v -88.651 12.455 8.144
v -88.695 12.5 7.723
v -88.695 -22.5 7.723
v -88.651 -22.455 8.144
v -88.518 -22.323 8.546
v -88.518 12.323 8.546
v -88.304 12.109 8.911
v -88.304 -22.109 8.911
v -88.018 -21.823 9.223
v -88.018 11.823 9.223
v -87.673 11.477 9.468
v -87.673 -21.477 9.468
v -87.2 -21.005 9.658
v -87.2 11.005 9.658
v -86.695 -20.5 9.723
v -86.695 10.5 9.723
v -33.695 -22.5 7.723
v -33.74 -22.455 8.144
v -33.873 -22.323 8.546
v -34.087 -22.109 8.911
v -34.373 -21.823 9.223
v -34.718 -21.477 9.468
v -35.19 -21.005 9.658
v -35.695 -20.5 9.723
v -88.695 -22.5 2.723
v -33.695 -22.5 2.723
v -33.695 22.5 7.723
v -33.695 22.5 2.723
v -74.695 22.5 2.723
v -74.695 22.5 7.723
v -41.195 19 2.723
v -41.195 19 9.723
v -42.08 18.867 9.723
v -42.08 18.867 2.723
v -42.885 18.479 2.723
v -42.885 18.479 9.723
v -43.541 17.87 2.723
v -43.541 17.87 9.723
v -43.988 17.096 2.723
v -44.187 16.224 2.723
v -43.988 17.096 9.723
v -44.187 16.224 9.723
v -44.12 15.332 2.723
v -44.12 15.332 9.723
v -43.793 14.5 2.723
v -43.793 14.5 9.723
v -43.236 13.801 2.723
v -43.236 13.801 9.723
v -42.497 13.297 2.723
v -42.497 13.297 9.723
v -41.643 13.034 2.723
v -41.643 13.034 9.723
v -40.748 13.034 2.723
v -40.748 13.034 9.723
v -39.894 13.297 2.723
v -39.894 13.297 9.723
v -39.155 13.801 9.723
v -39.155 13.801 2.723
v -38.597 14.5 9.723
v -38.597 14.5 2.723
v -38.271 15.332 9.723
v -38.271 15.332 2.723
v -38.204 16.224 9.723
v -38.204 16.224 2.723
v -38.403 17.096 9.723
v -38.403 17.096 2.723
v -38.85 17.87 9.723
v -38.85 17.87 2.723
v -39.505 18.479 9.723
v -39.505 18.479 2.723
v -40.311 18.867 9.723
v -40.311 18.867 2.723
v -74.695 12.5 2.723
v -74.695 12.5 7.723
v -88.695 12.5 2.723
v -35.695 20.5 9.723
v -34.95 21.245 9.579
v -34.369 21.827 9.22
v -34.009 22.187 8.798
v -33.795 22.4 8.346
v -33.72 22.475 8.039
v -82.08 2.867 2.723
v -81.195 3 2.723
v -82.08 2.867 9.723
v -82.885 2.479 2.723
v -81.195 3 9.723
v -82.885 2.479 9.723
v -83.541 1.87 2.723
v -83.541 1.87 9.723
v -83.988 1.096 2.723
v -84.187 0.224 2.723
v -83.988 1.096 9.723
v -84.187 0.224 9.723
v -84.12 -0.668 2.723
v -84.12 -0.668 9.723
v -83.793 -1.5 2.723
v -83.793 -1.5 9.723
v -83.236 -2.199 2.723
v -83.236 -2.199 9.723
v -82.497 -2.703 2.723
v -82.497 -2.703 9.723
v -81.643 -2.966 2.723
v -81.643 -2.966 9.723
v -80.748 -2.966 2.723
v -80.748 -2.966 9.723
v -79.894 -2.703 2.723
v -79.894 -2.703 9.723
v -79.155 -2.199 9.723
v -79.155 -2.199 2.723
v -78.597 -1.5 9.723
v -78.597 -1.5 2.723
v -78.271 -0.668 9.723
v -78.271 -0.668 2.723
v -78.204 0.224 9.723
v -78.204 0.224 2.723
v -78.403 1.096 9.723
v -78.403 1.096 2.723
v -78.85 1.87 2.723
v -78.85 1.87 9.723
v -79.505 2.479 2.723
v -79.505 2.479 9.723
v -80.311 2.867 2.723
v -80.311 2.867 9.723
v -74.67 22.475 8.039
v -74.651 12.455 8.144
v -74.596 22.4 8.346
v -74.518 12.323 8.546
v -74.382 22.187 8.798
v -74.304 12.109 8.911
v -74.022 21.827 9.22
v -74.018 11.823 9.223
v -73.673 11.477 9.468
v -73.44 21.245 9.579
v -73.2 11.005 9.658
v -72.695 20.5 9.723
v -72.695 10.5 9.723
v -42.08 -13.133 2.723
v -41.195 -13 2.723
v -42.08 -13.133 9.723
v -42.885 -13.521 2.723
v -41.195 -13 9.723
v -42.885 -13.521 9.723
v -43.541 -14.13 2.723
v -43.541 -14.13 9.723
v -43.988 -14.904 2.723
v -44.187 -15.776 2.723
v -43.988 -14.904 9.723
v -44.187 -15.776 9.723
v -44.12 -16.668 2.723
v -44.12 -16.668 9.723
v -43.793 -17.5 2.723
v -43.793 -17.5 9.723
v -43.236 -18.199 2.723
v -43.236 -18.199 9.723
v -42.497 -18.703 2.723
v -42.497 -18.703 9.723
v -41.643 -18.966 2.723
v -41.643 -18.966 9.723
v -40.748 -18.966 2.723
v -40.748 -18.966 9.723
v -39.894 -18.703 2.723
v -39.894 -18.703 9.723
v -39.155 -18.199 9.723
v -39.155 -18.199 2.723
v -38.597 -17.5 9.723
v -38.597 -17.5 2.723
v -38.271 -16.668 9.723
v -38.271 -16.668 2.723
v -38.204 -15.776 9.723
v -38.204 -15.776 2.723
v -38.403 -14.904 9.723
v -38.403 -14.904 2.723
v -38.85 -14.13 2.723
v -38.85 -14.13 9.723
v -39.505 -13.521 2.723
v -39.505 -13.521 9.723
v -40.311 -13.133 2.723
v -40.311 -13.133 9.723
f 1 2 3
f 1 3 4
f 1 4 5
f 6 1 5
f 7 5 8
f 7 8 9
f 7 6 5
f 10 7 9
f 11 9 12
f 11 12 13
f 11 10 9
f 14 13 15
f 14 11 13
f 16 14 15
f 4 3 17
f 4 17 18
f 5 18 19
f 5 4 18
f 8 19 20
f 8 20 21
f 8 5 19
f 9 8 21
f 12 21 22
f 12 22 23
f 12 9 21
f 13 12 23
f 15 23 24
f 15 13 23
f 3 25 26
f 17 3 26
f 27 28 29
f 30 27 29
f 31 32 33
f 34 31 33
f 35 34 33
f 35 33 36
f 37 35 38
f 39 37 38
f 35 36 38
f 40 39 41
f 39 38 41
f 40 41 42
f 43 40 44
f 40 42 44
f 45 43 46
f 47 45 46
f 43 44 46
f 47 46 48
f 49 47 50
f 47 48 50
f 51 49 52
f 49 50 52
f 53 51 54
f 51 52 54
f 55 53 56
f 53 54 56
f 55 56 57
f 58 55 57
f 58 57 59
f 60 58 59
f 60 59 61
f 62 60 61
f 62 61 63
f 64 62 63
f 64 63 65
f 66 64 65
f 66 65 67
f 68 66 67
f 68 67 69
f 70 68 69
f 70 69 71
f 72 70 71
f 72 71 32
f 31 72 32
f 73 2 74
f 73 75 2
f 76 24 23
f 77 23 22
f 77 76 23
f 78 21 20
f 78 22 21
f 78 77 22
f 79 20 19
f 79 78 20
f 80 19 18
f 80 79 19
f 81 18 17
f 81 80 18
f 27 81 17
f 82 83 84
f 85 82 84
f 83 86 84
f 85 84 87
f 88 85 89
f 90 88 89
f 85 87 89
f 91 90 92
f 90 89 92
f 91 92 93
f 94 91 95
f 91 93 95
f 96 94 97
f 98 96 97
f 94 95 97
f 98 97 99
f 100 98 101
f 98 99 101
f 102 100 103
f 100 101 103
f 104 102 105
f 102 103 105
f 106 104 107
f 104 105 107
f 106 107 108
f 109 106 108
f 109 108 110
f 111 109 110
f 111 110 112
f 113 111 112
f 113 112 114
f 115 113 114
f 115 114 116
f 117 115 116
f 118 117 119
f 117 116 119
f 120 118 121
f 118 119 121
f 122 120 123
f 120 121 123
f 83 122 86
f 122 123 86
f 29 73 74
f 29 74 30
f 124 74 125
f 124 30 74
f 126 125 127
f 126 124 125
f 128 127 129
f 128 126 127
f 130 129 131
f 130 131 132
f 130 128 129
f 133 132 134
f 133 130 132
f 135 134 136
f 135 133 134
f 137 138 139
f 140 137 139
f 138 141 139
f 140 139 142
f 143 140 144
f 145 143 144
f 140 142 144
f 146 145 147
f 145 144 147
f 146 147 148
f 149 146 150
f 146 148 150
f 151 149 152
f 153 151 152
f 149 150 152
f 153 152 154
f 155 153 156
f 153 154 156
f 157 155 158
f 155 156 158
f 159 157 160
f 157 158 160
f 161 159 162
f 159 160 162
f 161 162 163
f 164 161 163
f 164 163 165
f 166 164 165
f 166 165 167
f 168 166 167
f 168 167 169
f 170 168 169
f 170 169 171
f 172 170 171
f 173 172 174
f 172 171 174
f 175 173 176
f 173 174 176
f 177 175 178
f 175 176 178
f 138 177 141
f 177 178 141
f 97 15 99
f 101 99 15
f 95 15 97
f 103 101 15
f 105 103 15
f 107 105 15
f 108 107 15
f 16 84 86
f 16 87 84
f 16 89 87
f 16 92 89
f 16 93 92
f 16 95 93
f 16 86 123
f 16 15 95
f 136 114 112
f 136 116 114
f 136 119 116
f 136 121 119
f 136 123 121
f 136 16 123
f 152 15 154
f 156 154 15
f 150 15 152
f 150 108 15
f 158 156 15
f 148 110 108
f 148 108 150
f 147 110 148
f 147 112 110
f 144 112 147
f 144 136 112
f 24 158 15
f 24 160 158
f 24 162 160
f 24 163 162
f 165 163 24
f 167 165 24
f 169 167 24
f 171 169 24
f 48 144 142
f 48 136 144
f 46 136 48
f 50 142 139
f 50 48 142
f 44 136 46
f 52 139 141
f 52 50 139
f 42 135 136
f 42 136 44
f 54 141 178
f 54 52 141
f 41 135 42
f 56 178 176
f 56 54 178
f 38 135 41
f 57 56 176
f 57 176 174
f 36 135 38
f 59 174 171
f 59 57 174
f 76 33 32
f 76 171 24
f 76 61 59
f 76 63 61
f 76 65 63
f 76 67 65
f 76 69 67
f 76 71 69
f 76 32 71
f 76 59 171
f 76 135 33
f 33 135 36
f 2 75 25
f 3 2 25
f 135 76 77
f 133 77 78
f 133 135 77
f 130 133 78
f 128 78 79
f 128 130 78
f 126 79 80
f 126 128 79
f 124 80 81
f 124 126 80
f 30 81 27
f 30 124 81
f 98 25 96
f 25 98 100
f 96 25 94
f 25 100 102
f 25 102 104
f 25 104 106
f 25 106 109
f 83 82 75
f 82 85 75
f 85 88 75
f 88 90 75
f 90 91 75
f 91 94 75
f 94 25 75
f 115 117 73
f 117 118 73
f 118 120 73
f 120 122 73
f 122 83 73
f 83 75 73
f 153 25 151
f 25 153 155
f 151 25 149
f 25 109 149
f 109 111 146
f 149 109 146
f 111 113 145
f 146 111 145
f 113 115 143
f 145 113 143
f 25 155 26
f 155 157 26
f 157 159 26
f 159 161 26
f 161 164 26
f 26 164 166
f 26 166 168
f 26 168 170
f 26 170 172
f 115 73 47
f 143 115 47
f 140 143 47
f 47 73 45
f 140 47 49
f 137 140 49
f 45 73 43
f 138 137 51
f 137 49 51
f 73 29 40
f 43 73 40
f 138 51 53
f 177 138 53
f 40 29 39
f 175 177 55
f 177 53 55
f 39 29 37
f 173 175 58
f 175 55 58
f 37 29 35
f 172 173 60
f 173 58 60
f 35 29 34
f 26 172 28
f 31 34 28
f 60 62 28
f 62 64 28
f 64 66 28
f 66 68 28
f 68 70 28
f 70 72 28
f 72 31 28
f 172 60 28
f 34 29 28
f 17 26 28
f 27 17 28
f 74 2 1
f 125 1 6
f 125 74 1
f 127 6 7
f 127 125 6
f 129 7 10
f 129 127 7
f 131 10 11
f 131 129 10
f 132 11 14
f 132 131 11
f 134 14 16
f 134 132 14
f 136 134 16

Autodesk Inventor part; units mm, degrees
ref_plane "YZ Plane" through (0, 0, 0) normal (1, 0, 0) x (0, 1, 0)
ref_plane "XZ Plane" through (0, 0, 0) normal (0, 1, 0) x (-1, 0, 0)
ref_plane "XY Plane" through (0, 0, 0) normal (0, 0, 1) x (1, 0, 0)
ref_plane "Work Plane1" through (55, -70.0761, -12.5) normal (1, 0, 0) x (0, 0, -1)
ref_plane "Work Plane2" through (-33.6954, 10.9239, 2.7231) normal (0, 0, 1) x (1, 0, 0)
sketch "Sketch2" plane through (-33.6954, 10.9239, 2.7231) normal (0, 0, 1) x (1, 0, 0)
  line L0 (-55, -33.4239) -> (0, -33.4239)
  line L1 (0, -33.4239) -> (0, 11.5761)
  line L2 (0, 11.5761) -> (-55, 11.5761)
  line L3 (-55, 11.5761) -> (-55, -33.4239)
  line L4 (-55, 1.5761) -> (-41, 1.5761)
  line L5 (-41, 1.5761) -> (-41, 11.5761)
  line L6 (-7.5, -26.9239) -> (-7.5, -33.4239)
  line L7 (-7.5, 5.0761) -> (-7.5, 11.5761)
  line L8 (-7.5, -26.9239) -> (0, -26.9239)
  line L9 (-47.5, -10.9239) -> (-55, -10.9239)
  point P0 (-27.5, 11.5761)
  dimension "d4" = 55
  dimension "d5" = 45
  dimension "d10" = 14
  dimension "d11" = 10
  dimension "d14" = 40
  dimension "d15" = 32
  dimension "d23" = 16
extrude "Extrusion1" add sketch "Sketch2" along normal blind 7 contours L3 L4 L5 L2 L1 L8 L6 L0 | L6 L8 L1 L0
hole "Hole1" at (-41.1954, -16, 2.7231) at (-41.1954, 16, 2.7231) at (-81.1954, 0, 2.7231) direction (0, 0, 1) diameter 6 end through all
fillet "Fillet1" radius 2 6 edges at (-81.6954, 12.5, 9.7231) (-88.6954, -5, 9.7231) (-74.6954, 17.5, 9.7231) (-54.1954, 22.5, 9.7231) (-61.1954, -22.5, 9.7231) (-33.6954, 0, 9.7231)
properties part number "Print-head_Mount"
